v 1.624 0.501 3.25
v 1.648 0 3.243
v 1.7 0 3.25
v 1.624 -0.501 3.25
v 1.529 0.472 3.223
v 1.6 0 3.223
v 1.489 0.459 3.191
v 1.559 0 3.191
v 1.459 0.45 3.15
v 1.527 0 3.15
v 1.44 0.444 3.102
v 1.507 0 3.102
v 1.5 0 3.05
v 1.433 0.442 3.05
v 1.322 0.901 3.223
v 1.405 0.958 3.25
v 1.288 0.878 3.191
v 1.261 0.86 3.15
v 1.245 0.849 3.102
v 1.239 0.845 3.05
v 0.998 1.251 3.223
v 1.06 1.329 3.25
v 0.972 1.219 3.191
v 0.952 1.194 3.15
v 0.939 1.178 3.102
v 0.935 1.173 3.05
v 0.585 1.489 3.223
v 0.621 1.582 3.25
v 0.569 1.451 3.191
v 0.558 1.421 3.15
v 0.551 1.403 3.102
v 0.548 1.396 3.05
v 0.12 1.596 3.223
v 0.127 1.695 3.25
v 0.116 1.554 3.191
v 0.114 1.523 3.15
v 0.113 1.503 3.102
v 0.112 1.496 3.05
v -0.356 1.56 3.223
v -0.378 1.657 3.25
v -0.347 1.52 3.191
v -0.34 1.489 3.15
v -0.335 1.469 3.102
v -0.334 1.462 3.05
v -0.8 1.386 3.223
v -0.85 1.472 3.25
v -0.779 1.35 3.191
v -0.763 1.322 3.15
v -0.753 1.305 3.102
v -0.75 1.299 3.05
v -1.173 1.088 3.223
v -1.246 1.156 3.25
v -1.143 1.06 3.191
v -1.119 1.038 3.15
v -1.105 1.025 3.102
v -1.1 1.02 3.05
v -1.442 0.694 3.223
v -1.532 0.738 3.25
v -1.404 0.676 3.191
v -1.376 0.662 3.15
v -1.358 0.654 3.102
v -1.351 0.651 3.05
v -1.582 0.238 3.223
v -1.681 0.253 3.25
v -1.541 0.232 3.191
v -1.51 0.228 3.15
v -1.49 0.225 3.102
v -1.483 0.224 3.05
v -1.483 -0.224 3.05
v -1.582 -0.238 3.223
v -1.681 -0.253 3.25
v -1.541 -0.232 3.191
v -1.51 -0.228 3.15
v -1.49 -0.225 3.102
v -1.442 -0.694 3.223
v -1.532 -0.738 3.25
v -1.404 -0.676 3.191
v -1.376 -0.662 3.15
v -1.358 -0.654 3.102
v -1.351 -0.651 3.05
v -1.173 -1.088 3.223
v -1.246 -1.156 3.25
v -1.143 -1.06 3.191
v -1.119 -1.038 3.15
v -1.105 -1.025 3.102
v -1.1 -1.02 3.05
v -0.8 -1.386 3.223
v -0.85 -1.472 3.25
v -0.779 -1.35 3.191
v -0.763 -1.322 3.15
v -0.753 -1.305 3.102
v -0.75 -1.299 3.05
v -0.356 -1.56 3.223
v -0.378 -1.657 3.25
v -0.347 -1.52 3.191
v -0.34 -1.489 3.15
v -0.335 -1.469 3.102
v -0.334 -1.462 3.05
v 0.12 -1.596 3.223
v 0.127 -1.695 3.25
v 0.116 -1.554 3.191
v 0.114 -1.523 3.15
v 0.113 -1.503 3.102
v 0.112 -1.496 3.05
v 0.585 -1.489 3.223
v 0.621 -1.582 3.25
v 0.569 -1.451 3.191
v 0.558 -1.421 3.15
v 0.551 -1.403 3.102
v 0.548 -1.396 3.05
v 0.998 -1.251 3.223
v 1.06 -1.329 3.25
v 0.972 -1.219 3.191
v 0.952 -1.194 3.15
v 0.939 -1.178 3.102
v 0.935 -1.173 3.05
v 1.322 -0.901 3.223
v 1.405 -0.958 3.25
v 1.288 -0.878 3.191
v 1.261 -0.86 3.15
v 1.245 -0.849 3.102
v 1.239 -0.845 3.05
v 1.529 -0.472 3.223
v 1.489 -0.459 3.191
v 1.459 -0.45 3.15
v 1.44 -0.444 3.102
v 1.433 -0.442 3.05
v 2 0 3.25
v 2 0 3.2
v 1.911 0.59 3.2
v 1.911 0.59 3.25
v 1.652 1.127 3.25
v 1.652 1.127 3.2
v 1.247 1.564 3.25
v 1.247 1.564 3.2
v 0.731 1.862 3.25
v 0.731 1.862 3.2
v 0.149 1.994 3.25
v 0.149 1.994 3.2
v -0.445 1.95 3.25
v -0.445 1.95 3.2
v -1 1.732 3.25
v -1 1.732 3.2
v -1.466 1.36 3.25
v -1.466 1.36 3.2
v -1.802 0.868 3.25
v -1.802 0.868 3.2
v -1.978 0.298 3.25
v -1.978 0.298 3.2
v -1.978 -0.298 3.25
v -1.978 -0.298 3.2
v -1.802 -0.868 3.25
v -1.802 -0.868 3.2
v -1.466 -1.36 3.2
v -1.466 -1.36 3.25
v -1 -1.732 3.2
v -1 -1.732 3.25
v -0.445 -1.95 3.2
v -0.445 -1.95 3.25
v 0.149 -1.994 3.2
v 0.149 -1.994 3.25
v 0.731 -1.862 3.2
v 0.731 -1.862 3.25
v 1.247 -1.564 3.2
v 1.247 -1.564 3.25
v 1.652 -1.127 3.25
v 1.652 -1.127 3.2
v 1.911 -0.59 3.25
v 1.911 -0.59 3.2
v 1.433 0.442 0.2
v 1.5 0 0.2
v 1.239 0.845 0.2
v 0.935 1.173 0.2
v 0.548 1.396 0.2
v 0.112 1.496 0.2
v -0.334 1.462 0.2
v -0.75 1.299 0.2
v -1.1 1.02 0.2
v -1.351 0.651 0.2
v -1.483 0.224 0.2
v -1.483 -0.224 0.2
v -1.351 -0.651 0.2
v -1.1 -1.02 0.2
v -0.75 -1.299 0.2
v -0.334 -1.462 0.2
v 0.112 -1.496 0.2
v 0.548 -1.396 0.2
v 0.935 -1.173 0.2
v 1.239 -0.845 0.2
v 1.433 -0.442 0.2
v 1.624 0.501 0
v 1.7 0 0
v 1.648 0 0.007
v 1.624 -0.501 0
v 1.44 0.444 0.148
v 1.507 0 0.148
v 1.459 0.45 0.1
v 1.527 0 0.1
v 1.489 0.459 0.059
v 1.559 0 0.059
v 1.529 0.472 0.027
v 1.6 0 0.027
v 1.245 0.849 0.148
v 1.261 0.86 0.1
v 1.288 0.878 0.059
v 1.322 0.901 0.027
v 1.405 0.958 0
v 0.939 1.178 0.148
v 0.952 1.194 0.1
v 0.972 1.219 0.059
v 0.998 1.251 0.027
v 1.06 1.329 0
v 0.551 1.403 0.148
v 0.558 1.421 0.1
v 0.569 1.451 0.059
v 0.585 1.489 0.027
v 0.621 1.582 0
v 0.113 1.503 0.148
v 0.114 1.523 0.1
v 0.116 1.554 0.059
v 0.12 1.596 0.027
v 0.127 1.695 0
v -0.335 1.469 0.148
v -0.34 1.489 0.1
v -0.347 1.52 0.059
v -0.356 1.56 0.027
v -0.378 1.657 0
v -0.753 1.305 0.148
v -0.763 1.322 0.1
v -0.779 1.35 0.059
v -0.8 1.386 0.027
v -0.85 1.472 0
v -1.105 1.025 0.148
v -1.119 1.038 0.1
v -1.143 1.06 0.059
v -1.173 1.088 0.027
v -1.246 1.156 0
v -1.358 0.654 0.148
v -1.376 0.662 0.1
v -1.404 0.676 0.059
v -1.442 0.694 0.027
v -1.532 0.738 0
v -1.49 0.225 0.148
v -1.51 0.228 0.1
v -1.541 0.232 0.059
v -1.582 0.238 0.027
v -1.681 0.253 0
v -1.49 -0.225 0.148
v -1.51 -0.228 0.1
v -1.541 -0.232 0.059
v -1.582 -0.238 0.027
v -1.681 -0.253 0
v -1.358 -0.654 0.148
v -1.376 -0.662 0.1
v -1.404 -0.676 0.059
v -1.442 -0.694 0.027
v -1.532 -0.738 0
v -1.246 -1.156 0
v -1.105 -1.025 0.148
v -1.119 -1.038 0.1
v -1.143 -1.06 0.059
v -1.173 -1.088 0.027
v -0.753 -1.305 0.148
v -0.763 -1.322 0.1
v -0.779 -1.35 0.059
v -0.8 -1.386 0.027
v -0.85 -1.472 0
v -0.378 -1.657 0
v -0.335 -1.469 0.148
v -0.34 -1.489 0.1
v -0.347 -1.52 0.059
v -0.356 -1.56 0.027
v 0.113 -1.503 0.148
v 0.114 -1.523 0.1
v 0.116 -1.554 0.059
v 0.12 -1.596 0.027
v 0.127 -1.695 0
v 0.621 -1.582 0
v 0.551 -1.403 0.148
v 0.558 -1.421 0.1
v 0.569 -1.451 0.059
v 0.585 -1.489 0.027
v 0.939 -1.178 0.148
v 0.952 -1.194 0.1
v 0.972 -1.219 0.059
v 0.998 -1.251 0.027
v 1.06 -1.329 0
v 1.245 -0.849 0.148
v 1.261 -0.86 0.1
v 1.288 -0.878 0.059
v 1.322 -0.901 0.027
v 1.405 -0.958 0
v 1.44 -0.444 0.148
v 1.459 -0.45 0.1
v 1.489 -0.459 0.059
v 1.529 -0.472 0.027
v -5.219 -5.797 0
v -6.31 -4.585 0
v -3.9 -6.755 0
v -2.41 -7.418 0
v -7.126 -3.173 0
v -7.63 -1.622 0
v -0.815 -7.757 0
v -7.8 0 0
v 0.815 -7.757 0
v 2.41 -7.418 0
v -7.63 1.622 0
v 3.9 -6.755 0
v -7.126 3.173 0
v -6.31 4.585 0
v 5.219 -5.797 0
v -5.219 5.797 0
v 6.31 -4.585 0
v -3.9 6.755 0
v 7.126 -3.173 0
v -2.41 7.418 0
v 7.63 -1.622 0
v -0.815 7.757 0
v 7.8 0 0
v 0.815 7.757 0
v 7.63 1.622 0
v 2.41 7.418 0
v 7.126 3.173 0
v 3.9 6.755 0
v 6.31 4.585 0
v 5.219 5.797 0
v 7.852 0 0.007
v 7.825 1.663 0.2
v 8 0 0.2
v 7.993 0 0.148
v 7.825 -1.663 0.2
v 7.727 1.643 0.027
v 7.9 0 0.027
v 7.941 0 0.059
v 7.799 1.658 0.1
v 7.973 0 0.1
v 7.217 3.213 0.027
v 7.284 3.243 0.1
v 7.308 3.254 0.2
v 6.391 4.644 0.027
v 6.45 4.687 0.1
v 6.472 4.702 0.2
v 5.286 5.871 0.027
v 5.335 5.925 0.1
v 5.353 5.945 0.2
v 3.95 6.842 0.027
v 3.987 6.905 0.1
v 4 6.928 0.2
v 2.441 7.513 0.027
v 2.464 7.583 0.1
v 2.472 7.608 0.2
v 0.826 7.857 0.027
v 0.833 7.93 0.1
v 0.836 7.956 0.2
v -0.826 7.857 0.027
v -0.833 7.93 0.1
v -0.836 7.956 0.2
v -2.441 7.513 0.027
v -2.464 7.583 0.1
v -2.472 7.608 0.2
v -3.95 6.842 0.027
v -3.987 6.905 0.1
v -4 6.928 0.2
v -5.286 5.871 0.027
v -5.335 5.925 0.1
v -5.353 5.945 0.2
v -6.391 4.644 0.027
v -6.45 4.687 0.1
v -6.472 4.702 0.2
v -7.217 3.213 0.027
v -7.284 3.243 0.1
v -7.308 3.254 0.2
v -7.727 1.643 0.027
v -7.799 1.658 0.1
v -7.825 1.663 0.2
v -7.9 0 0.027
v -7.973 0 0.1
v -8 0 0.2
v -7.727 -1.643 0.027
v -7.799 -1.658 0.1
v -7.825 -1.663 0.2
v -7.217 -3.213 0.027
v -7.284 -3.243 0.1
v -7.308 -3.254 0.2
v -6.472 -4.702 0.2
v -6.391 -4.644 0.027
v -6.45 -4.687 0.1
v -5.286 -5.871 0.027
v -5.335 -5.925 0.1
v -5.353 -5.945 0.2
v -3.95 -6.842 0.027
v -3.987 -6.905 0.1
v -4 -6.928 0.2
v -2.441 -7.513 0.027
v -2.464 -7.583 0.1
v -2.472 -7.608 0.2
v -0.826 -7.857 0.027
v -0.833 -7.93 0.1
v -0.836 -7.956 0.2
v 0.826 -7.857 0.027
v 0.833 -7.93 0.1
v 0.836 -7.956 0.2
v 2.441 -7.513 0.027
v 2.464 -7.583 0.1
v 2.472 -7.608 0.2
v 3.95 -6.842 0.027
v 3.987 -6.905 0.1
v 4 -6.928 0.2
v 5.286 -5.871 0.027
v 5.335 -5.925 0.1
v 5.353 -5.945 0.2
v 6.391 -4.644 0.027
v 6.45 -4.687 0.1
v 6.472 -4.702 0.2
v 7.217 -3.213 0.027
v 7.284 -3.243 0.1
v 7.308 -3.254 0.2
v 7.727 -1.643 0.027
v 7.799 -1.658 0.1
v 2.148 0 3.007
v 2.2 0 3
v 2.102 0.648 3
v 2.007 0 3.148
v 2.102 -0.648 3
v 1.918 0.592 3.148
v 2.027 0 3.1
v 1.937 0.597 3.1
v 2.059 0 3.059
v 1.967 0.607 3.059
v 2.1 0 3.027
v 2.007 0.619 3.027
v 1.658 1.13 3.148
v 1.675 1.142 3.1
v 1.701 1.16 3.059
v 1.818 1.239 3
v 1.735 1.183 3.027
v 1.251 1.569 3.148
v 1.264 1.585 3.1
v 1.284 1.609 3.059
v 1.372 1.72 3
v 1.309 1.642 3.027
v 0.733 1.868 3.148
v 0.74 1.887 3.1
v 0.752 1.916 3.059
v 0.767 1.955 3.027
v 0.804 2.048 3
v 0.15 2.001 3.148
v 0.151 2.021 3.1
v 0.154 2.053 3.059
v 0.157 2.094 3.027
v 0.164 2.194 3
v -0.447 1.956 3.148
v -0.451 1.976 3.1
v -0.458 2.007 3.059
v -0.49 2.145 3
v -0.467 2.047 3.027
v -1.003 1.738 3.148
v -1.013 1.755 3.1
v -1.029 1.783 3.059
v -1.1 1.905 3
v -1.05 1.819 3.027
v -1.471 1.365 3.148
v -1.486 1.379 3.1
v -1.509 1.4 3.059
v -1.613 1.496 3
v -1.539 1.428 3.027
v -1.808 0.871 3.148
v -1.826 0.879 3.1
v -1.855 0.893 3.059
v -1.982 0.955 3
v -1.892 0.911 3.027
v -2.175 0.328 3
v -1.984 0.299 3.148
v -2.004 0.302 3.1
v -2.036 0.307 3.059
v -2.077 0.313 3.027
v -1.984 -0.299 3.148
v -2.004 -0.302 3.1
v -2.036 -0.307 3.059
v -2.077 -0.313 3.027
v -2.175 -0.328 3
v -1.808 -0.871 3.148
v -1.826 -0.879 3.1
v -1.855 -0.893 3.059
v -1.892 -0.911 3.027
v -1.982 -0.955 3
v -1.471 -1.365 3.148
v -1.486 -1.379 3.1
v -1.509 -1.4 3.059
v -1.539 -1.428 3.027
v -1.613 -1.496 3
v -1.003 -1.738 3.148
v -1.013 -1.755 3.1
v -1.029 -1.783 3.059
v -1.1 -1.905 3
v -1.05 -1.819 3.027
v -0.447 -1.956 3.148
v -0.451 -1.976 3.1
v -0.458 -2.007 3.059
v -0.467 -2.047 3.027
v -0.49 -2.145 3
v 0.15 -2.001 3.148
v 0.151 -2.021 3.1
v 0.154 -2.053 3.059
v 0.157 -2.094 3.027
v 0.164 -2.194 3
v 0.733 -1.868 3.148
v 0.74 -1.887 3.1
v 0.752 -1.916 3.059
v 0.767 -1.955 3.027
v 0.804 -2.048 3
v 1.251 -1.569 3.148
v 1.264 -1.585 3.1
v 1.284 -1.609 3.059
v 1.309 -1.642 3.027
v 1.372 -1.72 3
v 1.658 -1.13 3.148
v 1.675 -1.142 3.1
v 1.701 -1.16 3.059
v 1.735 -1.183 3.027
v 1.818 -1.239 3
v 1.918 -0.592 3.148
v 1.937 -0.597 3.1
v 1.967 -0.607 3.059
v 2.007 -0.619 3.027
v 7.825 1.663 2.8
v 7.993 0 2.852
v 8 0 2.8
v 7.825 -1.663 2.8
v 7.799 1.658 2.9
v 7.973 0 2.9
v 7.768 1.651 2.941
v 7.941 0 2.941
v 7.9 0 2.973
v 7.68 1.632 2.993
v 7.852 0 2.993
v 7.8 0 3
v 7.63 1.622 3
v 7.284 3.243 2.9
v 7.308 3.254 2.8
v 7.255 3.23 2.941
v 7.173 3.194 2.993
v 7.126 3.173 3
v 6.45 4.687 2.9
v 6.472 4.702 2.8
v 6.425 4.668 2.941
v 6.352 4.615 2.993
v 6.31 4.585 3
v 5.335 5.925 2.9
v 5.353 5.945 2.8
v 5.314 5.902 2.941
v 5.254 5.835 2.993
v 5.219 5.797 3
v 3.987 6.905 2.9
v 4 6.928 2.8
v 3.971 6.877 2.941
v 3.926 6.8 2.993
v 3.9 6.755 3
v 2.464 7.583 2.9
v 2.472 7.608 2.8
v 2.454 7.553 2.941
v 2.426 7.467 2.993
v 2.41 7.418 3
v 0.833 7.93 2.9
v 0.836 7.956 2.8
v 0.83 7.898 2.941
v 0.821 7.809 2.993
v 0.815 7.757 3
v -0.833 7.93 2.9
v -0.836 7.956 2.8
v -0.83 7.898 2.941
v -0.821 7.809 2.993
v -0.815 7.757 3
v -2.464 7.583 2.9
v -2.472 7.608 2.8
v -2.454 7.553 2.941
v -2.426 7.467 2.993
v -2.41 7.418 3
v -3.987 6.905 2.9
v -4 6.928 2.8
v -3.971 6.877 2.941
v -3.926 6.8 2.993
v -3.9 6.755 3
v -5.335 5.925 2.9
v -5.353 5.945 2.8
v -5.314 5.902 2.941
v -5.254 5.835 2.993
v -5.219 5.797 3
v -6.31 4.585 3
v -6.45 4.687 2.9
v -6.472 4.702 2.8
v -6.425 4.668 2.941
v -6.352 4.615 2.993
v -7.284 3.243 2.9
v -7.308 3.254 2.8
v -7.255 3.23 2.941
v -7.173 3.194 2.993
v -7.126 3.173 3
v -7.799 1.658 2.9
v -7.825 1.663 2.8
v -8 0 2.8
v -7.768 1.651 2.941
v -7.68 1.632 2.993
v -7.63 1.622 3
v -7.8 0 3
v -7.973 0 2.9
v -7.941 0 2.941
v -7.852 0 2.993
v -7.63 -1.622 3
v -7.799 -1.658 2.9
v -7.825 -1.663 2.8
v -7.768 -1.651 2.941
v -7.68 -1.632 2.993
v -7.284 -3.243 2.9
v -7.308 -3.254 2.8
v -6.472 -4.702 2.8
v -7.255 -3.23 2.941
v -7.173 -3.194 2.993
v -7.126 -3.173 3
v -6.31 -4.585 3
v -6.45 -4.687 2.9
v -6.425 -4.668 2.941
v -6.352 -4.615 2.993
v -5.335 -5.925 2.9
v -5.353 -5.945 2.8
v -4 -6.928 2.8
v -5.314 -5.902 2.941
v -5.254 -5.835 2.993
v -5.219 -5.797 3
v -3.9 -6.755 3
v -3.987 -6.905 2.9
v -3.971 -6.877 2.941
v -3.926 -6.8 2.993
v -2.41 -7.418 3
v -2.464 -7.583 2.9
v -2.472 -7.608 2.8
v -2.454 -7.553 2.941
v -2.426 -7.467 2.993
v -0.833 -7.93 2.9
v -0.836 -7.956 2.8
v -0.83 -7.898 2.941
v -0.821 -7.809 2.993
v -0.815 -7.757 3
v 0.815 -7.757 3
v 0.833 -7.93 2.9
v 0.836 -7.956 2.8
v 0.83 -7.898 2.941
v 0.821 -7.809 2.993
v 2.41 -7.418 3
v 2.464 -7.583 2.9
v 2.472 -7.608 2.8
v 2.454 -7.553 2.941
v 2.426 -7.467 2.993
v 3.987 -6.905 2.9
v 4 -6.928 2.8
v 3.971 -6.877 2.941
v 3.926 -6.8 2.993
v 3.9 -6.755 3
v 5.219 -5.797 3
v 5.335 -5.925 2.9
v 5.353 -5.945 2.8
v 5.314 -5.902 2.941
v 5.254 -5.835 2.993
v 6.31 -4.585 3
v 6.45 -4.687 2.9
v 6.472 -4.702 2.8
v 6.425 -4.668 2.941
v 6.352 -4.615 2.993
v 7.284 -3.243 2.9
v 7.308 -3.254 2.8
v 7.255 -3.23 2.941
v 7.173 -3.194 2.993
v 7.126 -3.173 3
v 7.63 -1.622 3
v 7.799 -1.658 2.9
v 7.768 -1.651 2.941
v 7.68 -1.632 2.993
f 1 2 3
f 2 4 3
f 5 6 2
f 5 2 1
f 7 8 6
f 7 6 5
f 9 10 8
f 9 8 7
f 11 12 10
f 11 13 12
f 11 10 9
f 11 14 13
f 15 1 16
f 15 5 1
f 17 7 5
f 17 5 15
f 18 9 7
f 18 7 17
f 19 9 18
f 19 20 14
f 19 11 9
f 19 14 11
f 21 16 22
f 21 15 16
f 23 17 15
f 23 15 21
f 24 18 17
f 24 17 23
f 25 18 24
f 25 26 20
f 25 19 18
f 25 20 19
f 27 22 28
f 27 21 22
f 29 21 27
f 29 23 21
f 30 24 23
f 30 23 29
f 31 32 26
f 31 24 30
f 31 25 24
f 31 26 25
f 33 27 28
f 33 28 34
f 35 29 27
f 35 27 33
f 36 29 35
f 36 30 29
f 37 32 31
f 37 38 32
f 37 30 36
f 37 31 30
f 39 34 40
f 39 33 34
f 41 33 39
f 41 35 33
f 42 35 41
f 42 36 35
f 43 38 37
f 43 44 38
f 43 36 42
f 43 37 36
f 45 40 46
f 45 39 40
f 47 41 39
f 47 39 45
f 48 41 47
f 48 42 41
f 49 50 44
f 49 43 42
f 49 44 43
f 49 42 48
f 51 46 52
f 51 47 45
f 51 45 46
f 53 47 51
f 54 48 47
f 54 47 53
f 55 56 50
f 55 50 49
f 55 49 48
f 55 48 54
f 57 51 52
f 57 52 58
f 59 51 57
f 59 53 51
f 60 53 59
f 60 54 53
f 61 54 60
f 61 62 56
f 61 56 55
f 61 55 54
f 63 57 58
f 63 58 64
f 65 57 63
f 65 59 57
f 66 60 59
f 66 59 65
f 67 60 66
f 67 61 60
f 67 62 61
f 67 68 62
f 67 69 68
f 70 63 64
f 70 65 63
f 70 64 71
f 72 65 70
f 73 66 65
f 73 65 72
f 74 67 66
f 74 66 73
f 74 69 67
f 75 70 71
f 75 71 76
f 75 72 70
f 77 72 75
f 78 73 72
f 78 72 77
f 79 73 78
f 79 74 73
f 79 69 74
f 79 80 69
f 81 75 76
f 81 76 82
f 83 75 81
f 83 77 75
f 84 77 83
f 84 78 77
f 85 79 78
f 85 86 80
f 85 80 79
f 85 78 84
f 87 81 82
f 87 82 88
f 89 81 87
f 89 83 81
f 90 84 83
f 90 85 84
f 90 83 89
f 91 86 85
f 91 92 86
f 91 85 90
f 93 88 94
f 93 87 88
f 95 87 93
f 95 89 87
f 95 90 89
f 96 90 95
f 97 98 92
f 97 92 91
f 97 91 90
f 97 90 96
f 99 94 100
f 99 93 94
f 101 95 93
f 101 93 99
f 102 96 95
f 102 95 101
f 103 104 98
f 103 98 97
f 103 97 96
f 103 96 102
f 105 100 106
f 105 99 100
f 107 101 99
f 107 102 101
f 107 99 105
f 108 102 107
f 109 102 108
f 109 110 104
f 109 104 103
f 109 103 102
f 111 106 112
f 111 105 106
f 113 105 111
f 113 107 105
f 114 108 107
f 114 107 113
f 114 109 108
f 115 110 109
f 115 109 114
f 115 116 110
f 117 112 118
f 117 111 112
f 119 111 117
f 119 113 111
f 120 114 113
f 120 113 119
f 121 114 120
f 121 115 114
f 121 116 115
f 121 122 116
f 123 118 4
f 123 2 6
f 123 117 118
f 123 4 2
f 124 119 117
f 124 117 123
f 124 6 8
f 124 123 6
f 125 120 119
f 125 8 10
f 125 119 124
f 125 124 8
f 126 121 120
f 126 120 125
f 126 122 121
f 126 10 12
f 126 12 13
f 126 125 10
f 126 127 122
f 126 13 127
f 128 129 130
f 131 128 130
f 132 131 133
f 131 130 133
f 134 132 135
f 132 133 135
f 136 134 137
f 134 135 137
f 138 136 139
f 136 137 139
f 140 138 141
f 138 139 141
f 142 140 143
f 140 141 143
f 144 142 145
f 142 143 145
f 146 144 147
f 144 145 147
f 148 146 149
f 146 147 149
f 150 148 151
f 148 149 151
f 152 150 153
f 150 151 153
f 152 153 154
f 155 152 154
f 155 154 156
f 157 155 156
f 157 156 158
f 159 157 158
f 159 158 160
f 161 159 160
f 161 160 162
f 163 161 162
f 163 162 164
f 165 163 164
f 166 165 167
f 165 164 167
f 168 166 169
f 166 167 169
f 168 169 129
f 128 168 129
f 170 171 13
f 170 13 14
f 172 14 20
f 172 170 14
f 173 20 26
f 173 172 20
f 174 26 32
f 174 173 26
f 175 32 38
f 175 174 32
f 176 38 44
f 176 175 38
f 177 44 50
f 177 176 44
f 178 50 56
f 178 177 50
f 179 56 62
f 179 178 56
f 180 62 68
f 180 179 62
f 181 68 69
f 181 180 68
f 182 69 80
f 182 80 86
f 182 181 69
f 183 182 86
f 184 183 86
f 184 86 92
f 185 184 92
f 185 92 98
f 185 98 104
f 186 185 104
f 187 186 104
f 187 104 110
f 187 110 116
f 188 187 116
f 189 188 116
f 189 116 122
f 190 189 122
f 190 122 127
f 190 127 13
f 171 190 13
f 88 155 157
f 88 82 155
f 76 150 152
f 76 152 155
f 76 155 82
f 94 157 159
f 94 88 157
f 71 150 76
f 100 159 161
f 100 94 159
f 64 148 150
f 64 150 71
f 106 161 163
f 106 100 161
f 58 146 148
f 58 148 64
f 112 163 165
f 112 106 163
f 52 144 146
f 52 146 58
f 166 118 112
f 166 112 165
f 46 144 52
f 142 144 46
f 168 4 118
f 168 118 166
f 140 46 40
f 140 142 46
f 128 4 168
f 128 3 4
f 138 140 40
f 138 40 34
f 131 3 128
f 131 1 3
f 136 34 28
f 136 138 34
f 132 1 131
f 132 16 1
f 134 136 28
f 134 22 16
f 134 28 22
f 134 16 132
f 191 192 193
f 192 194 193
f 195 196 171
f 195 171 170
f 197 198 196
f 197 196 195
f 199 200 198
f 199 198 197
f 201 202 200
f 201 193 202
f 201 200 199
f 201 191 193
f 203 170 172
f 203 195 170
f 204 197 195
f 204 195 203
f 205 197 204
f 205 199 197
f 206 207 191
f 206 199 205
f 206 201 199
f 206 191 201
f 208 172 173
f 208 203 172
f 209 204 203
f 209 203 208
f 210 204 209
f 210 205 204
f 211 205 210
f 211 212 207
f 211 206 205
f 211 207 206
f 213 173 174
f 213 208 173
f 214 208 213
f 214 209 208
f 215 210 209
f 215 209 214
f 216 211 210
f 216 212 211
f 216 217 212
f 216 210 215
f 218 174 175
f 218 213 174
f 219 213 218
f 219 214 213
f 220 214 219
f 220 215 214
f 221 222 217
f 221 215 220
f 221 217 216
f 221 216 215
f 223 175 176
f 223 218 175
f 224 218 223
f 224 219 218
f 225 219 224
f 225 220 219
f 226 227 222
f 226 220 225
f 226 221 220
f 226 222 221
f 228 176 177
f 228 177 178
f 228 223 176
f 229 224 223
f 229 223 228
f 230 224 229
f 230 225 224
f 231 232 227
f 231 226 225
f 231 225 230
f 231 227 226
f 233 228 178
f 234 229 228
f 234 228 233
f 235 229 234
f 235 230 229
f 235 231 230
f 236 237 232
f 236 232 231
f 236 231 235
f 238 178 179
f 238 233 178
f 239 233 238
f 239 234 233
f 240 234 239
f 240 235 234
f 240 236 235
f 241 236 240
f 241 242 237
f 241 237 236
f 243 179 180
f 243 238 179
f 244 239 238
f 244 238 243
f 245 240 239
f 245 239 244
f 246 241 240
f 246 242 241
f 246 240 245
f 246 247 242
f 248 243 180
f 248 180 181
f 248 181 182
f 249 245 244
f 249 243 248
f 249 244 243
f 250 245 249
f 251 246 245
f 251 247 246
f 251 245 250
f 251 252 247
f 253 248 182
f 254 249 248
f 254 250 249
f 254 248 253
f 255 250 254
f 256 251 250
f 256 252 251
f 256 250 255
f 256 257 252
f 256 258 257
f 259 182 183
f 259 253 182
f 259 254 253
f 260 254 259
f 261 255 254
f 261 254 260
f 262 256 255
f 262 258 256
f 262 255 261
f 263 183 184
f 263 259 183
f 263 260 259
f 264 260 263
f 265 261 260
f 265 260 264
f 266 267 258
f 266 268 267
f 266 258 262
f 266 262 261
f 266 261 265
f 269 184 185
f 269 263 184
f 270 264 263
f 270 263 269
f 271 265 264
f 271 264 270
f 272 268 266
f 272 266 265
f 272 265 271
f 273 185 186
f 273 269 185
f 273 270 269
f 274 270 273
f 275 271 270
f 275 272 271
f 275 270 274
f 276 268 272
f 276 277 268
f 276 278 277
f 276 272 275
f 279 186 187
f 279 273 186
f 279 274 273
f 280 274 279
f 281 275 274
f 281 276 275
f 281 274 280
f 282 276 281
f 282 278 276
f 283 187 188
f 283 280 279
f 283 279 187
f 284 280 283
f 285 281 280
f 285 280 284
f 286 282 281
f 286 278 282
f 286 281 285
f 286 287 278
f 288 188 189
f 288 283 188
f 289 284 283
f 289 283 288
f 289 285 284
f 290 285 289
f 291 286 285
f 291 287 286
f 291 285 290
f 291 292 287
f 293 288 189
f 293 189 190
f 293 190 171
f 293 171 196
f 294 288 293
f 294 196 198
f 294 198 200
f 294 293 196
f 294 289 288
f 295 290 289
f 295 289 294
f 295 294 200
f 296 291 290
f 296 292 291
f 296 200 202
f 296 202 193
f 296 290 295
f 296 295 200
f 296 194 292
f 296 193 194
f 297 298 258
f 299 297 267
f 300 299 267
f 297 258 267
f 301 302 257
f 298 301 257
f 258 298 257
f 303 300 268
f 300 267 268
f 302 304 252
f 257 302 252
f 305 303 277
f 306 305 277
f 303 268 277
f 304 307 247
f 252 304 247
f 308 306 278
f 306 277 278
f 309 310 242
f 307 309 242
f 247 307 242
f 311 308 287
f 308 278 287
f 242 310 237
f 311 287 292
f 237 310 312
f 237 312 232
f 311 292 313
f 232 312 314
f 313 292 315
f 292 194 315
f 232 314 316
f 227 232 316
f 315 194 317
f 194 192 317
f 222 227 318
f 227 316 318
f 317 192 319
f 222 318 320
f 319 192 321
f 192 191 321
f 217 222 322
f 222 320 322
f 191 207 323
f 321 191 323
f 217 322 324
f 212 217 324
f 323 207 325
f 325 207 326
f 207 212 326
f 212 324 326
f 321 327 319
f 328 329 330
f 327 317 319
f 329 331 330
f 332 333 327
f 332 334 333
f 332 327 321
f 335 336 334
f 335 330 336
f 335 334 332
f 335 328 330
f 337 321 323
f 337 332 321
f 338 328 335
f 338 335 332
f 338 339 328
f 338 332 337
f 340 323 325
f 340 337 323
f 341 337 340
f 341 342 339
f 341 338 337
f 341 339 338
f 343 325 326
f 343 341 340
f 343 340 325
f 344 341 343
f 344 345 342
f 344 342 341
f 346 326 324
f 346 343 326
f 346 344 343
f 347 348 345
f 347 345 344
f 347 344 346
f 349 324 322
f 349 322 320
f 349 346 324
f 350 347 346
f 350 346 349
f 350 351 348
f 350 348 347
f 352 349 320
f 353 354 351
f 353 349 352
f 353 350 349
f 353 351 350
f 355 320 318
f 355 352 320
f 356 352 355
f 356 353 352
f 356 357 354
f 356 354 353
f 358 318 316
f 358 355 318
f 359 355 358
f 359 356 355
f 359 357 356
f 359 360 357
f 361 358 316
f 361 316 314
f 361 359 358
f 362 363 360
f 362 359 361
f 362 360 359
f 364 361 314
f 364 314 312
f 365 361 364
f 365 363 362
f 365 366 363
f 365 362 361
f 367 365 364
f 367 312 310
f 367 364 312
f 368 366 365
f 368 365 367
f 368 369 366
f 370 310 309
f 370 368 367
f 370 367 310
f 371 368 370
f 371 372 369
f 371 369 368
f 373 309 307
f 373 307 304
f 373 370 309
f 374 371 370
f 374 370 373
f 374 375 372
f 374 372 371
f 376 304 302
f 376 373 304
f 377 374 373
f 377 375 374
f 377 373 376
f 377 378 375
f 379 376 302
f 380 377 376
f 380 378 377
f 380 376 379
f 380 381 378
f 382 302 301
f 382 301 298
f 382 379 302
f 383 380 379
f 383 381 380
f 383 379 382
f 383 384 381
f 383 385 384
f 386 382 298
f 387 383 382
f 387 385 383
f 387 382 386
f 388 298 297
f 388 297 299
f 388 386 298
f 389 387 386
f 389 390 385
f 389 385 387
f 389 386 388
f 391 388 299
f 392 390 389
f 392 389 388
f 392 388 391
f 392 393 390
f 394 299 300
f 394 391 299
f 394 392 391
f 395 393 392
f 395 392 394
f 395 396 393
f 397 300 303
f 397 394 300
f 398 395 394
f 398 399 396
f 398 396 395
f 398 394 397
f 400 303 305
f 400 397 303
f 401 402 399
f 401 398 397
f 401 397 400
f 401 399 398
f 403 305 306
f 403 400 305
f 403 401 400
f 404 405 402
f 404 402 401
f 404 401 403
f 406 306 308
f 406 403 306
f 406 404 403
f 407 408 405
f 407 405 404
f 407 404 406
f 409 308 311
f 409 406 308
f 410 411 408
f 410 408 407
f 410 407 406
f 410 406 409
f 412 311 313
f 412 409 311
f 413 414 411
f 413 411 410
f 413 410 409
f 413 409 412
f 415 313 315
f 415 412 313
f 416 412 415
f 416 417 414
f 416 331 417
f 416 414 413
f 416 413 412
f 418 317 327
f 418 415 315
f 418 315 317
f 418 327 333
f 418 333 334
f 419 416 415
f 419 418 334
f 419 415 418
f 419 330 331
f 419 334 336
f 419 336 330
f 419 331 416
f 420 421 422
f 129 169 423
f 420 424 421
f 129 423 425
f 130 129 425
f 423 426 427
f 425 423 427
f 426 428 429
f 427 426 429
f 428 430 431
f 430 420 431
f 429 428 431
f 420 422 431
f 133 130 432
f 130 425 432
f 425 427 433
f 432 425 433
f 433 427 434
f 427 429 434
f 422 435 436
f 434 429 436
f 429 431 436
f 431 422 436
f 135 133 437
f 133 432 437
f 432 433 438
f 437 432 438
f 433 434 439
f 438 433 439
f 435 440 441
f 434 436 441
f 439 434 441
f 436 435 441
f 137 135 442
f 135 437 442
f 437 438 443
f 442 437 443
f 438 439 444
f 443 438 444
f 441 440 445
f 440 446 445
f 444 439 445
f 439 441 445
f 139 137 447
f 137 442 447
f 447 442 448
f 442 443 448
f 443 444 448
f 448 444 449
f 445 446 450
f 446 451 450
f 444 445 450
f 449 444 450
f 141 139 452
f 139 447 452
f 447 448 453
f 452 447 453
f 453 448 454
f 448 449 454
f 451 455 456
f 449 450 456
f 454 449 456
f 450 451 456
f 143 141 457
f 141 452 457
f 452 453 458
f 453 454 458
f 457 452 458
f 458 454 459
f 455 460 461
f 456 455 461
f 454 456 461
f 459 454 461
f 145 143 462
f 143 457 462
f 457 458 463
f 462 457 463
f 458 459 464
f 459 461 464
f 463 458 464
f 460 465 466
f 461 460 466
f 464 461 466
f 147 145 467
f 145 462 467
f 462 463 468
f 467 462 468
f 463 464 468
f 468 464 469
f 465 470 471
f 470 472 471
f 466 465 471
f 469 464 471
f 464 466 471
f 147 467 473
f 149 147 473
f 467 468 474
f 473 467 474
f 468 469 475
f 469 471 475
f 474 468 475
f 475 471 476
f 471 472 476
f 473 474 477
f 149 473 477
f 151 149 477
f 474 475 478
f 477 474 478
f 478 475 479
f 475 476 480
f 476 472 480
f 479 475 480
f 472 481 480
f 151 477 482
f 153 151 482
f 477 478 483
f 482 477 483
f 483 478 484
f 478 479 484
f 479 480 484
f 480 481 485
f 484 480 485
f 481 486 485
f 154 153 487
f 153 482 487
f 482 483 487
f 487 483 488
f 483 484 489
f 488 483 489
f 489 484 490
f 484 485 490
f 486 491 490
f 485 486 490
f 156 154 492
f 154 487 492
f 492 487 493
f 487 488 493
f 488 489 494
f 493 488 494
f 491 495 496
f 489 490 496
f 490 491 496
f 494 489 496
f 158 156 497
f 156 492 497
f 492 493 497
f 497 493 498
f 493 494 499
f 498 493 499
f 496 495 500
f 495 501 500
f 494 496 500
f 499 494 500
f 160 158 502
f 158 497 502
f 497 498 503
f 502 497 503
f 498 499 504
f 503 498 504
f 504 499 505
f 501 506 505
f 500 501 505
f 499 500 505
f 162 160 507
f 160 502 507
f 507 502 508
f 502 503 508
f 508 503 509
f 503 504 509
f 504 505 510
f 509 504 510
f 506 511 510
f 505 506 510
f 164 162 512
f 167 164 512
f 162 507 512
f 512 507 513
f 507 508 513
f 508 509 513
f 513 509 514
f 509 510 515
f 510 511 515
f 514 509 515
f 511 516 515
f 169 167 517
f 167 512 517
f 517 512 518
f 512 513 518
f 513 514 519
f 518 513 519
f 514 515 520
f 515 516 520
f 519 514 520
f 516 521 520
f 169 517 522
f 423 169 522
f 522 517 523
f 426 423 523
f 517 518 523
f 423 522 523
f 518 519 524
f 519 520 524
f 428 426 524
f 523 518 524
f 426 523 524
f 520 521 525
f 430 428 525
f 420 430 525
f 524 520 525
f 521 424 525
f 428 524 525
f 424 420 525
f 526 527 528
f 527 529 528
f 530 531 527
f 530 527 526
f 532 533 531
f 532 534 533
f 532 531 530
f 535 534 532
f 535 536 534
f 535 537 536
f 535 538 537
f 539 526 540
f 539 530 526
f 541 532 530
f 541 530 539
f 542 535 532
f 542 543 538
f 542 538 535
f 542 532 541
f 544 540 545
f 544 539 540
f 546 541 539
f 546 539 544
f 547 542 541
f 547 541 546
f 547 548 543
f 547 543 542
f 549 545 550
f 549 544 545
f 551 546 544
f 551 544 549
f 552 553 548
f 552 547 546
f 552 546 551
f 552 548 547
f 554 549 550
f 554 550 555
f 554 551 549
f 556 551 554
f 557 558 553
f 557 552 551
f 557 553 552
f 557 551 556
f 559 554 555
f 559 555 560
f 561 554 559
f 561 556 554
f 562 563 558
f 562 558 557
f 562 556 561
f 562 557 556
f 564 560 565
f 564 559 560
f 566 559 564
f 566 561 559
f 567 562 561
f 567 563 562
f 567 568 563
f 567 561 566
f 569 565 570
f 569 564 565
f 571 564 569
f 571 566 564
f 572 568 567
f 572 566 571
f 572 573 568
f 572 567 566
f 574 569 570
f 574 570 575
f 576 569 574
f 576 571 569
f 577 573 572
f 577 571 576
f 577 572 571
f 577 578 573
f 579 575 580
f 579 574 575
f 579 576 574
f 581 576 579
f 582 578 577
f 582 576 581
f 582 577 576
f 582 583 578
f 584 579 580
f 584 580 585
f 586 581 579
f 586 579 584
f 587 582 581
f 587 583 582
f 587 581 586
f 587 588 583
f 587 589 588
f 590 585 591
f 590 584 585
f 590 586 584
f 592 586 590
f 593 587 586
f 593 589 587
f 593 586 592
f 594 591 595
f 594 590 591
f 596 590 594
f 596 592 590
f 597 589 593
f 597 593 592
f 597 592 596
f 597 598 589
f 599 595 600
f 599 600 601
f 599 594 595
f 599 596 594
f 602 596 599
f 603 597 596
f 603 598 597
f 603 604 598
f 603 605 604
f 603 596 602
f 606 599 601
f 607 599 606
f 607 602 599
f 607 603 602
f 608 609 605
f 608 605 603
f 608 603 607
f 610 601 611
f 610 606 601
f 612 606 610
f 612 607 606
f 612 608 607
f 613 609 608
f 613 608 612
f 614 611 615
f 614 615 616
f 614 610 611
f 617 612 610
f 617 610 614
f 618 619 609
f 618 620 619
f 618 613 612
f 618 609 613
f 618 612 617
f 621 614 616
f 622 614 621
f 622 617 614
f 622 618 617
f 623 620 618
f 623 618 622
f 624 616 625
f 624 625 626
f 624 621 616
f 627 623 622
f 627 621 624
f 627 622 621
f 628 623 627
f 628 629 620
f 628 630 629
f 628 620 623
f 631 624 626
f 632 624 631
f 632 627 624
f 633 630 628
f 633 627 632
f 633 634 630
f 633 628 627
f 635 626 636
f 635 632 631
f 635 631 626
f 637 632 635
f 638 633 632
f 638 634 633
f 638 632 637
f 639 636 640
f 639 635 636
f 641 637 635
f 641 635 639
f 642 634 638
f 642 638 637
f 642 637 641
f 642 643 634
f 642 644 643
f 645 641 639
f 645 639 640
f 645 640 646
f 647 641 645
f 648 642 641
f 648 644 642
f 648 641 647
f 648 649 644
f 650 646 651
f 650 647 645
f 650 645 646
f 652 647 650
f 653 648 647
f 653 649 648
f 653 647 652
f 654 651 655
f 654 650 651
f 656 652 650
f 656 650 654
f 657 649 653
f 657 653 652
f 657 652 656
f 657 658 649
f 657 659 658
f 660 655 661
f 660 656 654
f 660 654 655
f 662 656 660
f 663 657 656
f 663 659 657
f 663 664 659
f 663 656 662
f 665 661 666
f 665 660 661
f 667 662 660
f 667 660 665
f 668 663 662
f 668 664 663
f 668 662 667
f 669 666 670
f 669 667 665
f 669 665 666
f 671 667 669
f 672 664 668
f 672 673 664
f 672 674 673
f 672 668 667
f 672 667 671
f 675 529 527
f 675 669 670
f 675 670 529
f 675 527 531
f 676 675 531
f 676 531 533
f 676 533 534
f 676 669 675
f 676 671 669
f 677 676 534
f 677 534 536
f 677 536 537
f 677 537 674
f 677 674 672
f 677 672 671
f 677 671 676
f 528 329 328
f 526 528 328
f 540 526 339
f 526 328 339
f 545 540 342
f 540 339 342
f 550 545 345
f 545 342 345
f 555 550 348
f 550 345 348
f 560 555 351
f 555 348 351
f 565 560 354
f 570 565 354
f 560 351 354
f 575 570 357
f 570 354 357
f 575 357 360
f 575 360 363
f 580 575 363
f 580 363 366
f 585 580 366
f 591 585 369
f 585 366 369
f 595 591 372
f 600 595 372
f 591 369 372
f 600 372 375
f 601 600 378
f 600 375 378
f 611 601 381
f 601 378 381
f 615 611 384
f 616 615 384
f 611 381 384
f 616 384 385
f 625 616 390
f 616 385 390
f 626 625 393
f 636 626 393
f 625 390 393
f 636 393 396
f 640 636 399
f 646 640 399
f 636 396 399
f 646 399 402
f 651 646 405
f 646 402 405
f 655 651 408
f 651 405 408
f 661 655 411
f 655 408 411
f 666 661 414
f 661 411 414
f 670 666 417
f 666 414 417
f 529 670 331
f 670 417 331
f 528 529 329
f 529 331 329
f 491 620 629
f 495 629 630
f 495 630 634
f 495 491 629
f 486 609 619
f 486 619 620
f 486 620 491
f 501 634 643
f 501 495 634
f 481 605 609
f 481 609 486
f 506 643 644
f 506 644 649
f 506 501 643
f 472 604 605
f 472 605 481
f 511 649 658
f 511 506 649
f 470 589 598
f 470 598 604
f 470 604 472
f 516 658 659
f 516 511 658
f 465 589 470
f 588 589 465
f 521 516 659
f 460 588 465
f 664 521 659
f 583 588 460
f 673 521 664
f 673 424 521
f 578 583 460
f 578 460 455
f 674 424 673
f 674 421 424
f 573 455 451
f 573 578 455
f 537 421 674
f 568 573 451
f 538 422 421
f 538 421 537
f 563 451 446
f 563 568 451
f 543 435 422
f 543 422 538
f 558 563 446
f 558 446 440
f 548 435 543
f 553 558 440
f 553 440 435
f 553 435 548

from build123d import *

# Parameters (mm, degrees)
ESQUISSE1_R      = 8
ESQUISSE1_R_2    = 1.5
EXTRUSION1_DEPTH = 3
ESQUISSE2_R      = 2
ESQUISSE2_R_2    = 1.5
EXTRUSION2_DEPTH = 0.25
CONG_1_R         = 0.2


with BuildPart() as part:
    # Esquisse1 → Extrusion1 (new body)
    with BuildSketch(Plane.XY):
        Circle(ESQUISSE1_R)
        Circle(ESQUISSE1_R_2, mode=Mode.SUBTRACT)
    extrude(amount=EXTRUSION1_DEPTH)

    # Esquisse2 → Extrusion2 (add)
    with BuildSketch(Plane.XY.offset(3)):
        Circle(ESQUISSE2_R)
        Circle(ESQUISSE2_R_2, mode=Mode.SUBTRACT)
    extrude(amount=EXTRUSION2_DEPTH)

    # Congé1
    cong_1_edges = [part.edges().sort_by_distance(p)[0] for p in [
        (-8, 0, 0),
        (-8, 0, 3),
        (-2, 0, 3),
        (-1.5, 0, 3.25),
        (-1.5, 0, 0),
    ]]
    fillet(cong_1_edges, radius=CONG_1_R)


solid = part.part
